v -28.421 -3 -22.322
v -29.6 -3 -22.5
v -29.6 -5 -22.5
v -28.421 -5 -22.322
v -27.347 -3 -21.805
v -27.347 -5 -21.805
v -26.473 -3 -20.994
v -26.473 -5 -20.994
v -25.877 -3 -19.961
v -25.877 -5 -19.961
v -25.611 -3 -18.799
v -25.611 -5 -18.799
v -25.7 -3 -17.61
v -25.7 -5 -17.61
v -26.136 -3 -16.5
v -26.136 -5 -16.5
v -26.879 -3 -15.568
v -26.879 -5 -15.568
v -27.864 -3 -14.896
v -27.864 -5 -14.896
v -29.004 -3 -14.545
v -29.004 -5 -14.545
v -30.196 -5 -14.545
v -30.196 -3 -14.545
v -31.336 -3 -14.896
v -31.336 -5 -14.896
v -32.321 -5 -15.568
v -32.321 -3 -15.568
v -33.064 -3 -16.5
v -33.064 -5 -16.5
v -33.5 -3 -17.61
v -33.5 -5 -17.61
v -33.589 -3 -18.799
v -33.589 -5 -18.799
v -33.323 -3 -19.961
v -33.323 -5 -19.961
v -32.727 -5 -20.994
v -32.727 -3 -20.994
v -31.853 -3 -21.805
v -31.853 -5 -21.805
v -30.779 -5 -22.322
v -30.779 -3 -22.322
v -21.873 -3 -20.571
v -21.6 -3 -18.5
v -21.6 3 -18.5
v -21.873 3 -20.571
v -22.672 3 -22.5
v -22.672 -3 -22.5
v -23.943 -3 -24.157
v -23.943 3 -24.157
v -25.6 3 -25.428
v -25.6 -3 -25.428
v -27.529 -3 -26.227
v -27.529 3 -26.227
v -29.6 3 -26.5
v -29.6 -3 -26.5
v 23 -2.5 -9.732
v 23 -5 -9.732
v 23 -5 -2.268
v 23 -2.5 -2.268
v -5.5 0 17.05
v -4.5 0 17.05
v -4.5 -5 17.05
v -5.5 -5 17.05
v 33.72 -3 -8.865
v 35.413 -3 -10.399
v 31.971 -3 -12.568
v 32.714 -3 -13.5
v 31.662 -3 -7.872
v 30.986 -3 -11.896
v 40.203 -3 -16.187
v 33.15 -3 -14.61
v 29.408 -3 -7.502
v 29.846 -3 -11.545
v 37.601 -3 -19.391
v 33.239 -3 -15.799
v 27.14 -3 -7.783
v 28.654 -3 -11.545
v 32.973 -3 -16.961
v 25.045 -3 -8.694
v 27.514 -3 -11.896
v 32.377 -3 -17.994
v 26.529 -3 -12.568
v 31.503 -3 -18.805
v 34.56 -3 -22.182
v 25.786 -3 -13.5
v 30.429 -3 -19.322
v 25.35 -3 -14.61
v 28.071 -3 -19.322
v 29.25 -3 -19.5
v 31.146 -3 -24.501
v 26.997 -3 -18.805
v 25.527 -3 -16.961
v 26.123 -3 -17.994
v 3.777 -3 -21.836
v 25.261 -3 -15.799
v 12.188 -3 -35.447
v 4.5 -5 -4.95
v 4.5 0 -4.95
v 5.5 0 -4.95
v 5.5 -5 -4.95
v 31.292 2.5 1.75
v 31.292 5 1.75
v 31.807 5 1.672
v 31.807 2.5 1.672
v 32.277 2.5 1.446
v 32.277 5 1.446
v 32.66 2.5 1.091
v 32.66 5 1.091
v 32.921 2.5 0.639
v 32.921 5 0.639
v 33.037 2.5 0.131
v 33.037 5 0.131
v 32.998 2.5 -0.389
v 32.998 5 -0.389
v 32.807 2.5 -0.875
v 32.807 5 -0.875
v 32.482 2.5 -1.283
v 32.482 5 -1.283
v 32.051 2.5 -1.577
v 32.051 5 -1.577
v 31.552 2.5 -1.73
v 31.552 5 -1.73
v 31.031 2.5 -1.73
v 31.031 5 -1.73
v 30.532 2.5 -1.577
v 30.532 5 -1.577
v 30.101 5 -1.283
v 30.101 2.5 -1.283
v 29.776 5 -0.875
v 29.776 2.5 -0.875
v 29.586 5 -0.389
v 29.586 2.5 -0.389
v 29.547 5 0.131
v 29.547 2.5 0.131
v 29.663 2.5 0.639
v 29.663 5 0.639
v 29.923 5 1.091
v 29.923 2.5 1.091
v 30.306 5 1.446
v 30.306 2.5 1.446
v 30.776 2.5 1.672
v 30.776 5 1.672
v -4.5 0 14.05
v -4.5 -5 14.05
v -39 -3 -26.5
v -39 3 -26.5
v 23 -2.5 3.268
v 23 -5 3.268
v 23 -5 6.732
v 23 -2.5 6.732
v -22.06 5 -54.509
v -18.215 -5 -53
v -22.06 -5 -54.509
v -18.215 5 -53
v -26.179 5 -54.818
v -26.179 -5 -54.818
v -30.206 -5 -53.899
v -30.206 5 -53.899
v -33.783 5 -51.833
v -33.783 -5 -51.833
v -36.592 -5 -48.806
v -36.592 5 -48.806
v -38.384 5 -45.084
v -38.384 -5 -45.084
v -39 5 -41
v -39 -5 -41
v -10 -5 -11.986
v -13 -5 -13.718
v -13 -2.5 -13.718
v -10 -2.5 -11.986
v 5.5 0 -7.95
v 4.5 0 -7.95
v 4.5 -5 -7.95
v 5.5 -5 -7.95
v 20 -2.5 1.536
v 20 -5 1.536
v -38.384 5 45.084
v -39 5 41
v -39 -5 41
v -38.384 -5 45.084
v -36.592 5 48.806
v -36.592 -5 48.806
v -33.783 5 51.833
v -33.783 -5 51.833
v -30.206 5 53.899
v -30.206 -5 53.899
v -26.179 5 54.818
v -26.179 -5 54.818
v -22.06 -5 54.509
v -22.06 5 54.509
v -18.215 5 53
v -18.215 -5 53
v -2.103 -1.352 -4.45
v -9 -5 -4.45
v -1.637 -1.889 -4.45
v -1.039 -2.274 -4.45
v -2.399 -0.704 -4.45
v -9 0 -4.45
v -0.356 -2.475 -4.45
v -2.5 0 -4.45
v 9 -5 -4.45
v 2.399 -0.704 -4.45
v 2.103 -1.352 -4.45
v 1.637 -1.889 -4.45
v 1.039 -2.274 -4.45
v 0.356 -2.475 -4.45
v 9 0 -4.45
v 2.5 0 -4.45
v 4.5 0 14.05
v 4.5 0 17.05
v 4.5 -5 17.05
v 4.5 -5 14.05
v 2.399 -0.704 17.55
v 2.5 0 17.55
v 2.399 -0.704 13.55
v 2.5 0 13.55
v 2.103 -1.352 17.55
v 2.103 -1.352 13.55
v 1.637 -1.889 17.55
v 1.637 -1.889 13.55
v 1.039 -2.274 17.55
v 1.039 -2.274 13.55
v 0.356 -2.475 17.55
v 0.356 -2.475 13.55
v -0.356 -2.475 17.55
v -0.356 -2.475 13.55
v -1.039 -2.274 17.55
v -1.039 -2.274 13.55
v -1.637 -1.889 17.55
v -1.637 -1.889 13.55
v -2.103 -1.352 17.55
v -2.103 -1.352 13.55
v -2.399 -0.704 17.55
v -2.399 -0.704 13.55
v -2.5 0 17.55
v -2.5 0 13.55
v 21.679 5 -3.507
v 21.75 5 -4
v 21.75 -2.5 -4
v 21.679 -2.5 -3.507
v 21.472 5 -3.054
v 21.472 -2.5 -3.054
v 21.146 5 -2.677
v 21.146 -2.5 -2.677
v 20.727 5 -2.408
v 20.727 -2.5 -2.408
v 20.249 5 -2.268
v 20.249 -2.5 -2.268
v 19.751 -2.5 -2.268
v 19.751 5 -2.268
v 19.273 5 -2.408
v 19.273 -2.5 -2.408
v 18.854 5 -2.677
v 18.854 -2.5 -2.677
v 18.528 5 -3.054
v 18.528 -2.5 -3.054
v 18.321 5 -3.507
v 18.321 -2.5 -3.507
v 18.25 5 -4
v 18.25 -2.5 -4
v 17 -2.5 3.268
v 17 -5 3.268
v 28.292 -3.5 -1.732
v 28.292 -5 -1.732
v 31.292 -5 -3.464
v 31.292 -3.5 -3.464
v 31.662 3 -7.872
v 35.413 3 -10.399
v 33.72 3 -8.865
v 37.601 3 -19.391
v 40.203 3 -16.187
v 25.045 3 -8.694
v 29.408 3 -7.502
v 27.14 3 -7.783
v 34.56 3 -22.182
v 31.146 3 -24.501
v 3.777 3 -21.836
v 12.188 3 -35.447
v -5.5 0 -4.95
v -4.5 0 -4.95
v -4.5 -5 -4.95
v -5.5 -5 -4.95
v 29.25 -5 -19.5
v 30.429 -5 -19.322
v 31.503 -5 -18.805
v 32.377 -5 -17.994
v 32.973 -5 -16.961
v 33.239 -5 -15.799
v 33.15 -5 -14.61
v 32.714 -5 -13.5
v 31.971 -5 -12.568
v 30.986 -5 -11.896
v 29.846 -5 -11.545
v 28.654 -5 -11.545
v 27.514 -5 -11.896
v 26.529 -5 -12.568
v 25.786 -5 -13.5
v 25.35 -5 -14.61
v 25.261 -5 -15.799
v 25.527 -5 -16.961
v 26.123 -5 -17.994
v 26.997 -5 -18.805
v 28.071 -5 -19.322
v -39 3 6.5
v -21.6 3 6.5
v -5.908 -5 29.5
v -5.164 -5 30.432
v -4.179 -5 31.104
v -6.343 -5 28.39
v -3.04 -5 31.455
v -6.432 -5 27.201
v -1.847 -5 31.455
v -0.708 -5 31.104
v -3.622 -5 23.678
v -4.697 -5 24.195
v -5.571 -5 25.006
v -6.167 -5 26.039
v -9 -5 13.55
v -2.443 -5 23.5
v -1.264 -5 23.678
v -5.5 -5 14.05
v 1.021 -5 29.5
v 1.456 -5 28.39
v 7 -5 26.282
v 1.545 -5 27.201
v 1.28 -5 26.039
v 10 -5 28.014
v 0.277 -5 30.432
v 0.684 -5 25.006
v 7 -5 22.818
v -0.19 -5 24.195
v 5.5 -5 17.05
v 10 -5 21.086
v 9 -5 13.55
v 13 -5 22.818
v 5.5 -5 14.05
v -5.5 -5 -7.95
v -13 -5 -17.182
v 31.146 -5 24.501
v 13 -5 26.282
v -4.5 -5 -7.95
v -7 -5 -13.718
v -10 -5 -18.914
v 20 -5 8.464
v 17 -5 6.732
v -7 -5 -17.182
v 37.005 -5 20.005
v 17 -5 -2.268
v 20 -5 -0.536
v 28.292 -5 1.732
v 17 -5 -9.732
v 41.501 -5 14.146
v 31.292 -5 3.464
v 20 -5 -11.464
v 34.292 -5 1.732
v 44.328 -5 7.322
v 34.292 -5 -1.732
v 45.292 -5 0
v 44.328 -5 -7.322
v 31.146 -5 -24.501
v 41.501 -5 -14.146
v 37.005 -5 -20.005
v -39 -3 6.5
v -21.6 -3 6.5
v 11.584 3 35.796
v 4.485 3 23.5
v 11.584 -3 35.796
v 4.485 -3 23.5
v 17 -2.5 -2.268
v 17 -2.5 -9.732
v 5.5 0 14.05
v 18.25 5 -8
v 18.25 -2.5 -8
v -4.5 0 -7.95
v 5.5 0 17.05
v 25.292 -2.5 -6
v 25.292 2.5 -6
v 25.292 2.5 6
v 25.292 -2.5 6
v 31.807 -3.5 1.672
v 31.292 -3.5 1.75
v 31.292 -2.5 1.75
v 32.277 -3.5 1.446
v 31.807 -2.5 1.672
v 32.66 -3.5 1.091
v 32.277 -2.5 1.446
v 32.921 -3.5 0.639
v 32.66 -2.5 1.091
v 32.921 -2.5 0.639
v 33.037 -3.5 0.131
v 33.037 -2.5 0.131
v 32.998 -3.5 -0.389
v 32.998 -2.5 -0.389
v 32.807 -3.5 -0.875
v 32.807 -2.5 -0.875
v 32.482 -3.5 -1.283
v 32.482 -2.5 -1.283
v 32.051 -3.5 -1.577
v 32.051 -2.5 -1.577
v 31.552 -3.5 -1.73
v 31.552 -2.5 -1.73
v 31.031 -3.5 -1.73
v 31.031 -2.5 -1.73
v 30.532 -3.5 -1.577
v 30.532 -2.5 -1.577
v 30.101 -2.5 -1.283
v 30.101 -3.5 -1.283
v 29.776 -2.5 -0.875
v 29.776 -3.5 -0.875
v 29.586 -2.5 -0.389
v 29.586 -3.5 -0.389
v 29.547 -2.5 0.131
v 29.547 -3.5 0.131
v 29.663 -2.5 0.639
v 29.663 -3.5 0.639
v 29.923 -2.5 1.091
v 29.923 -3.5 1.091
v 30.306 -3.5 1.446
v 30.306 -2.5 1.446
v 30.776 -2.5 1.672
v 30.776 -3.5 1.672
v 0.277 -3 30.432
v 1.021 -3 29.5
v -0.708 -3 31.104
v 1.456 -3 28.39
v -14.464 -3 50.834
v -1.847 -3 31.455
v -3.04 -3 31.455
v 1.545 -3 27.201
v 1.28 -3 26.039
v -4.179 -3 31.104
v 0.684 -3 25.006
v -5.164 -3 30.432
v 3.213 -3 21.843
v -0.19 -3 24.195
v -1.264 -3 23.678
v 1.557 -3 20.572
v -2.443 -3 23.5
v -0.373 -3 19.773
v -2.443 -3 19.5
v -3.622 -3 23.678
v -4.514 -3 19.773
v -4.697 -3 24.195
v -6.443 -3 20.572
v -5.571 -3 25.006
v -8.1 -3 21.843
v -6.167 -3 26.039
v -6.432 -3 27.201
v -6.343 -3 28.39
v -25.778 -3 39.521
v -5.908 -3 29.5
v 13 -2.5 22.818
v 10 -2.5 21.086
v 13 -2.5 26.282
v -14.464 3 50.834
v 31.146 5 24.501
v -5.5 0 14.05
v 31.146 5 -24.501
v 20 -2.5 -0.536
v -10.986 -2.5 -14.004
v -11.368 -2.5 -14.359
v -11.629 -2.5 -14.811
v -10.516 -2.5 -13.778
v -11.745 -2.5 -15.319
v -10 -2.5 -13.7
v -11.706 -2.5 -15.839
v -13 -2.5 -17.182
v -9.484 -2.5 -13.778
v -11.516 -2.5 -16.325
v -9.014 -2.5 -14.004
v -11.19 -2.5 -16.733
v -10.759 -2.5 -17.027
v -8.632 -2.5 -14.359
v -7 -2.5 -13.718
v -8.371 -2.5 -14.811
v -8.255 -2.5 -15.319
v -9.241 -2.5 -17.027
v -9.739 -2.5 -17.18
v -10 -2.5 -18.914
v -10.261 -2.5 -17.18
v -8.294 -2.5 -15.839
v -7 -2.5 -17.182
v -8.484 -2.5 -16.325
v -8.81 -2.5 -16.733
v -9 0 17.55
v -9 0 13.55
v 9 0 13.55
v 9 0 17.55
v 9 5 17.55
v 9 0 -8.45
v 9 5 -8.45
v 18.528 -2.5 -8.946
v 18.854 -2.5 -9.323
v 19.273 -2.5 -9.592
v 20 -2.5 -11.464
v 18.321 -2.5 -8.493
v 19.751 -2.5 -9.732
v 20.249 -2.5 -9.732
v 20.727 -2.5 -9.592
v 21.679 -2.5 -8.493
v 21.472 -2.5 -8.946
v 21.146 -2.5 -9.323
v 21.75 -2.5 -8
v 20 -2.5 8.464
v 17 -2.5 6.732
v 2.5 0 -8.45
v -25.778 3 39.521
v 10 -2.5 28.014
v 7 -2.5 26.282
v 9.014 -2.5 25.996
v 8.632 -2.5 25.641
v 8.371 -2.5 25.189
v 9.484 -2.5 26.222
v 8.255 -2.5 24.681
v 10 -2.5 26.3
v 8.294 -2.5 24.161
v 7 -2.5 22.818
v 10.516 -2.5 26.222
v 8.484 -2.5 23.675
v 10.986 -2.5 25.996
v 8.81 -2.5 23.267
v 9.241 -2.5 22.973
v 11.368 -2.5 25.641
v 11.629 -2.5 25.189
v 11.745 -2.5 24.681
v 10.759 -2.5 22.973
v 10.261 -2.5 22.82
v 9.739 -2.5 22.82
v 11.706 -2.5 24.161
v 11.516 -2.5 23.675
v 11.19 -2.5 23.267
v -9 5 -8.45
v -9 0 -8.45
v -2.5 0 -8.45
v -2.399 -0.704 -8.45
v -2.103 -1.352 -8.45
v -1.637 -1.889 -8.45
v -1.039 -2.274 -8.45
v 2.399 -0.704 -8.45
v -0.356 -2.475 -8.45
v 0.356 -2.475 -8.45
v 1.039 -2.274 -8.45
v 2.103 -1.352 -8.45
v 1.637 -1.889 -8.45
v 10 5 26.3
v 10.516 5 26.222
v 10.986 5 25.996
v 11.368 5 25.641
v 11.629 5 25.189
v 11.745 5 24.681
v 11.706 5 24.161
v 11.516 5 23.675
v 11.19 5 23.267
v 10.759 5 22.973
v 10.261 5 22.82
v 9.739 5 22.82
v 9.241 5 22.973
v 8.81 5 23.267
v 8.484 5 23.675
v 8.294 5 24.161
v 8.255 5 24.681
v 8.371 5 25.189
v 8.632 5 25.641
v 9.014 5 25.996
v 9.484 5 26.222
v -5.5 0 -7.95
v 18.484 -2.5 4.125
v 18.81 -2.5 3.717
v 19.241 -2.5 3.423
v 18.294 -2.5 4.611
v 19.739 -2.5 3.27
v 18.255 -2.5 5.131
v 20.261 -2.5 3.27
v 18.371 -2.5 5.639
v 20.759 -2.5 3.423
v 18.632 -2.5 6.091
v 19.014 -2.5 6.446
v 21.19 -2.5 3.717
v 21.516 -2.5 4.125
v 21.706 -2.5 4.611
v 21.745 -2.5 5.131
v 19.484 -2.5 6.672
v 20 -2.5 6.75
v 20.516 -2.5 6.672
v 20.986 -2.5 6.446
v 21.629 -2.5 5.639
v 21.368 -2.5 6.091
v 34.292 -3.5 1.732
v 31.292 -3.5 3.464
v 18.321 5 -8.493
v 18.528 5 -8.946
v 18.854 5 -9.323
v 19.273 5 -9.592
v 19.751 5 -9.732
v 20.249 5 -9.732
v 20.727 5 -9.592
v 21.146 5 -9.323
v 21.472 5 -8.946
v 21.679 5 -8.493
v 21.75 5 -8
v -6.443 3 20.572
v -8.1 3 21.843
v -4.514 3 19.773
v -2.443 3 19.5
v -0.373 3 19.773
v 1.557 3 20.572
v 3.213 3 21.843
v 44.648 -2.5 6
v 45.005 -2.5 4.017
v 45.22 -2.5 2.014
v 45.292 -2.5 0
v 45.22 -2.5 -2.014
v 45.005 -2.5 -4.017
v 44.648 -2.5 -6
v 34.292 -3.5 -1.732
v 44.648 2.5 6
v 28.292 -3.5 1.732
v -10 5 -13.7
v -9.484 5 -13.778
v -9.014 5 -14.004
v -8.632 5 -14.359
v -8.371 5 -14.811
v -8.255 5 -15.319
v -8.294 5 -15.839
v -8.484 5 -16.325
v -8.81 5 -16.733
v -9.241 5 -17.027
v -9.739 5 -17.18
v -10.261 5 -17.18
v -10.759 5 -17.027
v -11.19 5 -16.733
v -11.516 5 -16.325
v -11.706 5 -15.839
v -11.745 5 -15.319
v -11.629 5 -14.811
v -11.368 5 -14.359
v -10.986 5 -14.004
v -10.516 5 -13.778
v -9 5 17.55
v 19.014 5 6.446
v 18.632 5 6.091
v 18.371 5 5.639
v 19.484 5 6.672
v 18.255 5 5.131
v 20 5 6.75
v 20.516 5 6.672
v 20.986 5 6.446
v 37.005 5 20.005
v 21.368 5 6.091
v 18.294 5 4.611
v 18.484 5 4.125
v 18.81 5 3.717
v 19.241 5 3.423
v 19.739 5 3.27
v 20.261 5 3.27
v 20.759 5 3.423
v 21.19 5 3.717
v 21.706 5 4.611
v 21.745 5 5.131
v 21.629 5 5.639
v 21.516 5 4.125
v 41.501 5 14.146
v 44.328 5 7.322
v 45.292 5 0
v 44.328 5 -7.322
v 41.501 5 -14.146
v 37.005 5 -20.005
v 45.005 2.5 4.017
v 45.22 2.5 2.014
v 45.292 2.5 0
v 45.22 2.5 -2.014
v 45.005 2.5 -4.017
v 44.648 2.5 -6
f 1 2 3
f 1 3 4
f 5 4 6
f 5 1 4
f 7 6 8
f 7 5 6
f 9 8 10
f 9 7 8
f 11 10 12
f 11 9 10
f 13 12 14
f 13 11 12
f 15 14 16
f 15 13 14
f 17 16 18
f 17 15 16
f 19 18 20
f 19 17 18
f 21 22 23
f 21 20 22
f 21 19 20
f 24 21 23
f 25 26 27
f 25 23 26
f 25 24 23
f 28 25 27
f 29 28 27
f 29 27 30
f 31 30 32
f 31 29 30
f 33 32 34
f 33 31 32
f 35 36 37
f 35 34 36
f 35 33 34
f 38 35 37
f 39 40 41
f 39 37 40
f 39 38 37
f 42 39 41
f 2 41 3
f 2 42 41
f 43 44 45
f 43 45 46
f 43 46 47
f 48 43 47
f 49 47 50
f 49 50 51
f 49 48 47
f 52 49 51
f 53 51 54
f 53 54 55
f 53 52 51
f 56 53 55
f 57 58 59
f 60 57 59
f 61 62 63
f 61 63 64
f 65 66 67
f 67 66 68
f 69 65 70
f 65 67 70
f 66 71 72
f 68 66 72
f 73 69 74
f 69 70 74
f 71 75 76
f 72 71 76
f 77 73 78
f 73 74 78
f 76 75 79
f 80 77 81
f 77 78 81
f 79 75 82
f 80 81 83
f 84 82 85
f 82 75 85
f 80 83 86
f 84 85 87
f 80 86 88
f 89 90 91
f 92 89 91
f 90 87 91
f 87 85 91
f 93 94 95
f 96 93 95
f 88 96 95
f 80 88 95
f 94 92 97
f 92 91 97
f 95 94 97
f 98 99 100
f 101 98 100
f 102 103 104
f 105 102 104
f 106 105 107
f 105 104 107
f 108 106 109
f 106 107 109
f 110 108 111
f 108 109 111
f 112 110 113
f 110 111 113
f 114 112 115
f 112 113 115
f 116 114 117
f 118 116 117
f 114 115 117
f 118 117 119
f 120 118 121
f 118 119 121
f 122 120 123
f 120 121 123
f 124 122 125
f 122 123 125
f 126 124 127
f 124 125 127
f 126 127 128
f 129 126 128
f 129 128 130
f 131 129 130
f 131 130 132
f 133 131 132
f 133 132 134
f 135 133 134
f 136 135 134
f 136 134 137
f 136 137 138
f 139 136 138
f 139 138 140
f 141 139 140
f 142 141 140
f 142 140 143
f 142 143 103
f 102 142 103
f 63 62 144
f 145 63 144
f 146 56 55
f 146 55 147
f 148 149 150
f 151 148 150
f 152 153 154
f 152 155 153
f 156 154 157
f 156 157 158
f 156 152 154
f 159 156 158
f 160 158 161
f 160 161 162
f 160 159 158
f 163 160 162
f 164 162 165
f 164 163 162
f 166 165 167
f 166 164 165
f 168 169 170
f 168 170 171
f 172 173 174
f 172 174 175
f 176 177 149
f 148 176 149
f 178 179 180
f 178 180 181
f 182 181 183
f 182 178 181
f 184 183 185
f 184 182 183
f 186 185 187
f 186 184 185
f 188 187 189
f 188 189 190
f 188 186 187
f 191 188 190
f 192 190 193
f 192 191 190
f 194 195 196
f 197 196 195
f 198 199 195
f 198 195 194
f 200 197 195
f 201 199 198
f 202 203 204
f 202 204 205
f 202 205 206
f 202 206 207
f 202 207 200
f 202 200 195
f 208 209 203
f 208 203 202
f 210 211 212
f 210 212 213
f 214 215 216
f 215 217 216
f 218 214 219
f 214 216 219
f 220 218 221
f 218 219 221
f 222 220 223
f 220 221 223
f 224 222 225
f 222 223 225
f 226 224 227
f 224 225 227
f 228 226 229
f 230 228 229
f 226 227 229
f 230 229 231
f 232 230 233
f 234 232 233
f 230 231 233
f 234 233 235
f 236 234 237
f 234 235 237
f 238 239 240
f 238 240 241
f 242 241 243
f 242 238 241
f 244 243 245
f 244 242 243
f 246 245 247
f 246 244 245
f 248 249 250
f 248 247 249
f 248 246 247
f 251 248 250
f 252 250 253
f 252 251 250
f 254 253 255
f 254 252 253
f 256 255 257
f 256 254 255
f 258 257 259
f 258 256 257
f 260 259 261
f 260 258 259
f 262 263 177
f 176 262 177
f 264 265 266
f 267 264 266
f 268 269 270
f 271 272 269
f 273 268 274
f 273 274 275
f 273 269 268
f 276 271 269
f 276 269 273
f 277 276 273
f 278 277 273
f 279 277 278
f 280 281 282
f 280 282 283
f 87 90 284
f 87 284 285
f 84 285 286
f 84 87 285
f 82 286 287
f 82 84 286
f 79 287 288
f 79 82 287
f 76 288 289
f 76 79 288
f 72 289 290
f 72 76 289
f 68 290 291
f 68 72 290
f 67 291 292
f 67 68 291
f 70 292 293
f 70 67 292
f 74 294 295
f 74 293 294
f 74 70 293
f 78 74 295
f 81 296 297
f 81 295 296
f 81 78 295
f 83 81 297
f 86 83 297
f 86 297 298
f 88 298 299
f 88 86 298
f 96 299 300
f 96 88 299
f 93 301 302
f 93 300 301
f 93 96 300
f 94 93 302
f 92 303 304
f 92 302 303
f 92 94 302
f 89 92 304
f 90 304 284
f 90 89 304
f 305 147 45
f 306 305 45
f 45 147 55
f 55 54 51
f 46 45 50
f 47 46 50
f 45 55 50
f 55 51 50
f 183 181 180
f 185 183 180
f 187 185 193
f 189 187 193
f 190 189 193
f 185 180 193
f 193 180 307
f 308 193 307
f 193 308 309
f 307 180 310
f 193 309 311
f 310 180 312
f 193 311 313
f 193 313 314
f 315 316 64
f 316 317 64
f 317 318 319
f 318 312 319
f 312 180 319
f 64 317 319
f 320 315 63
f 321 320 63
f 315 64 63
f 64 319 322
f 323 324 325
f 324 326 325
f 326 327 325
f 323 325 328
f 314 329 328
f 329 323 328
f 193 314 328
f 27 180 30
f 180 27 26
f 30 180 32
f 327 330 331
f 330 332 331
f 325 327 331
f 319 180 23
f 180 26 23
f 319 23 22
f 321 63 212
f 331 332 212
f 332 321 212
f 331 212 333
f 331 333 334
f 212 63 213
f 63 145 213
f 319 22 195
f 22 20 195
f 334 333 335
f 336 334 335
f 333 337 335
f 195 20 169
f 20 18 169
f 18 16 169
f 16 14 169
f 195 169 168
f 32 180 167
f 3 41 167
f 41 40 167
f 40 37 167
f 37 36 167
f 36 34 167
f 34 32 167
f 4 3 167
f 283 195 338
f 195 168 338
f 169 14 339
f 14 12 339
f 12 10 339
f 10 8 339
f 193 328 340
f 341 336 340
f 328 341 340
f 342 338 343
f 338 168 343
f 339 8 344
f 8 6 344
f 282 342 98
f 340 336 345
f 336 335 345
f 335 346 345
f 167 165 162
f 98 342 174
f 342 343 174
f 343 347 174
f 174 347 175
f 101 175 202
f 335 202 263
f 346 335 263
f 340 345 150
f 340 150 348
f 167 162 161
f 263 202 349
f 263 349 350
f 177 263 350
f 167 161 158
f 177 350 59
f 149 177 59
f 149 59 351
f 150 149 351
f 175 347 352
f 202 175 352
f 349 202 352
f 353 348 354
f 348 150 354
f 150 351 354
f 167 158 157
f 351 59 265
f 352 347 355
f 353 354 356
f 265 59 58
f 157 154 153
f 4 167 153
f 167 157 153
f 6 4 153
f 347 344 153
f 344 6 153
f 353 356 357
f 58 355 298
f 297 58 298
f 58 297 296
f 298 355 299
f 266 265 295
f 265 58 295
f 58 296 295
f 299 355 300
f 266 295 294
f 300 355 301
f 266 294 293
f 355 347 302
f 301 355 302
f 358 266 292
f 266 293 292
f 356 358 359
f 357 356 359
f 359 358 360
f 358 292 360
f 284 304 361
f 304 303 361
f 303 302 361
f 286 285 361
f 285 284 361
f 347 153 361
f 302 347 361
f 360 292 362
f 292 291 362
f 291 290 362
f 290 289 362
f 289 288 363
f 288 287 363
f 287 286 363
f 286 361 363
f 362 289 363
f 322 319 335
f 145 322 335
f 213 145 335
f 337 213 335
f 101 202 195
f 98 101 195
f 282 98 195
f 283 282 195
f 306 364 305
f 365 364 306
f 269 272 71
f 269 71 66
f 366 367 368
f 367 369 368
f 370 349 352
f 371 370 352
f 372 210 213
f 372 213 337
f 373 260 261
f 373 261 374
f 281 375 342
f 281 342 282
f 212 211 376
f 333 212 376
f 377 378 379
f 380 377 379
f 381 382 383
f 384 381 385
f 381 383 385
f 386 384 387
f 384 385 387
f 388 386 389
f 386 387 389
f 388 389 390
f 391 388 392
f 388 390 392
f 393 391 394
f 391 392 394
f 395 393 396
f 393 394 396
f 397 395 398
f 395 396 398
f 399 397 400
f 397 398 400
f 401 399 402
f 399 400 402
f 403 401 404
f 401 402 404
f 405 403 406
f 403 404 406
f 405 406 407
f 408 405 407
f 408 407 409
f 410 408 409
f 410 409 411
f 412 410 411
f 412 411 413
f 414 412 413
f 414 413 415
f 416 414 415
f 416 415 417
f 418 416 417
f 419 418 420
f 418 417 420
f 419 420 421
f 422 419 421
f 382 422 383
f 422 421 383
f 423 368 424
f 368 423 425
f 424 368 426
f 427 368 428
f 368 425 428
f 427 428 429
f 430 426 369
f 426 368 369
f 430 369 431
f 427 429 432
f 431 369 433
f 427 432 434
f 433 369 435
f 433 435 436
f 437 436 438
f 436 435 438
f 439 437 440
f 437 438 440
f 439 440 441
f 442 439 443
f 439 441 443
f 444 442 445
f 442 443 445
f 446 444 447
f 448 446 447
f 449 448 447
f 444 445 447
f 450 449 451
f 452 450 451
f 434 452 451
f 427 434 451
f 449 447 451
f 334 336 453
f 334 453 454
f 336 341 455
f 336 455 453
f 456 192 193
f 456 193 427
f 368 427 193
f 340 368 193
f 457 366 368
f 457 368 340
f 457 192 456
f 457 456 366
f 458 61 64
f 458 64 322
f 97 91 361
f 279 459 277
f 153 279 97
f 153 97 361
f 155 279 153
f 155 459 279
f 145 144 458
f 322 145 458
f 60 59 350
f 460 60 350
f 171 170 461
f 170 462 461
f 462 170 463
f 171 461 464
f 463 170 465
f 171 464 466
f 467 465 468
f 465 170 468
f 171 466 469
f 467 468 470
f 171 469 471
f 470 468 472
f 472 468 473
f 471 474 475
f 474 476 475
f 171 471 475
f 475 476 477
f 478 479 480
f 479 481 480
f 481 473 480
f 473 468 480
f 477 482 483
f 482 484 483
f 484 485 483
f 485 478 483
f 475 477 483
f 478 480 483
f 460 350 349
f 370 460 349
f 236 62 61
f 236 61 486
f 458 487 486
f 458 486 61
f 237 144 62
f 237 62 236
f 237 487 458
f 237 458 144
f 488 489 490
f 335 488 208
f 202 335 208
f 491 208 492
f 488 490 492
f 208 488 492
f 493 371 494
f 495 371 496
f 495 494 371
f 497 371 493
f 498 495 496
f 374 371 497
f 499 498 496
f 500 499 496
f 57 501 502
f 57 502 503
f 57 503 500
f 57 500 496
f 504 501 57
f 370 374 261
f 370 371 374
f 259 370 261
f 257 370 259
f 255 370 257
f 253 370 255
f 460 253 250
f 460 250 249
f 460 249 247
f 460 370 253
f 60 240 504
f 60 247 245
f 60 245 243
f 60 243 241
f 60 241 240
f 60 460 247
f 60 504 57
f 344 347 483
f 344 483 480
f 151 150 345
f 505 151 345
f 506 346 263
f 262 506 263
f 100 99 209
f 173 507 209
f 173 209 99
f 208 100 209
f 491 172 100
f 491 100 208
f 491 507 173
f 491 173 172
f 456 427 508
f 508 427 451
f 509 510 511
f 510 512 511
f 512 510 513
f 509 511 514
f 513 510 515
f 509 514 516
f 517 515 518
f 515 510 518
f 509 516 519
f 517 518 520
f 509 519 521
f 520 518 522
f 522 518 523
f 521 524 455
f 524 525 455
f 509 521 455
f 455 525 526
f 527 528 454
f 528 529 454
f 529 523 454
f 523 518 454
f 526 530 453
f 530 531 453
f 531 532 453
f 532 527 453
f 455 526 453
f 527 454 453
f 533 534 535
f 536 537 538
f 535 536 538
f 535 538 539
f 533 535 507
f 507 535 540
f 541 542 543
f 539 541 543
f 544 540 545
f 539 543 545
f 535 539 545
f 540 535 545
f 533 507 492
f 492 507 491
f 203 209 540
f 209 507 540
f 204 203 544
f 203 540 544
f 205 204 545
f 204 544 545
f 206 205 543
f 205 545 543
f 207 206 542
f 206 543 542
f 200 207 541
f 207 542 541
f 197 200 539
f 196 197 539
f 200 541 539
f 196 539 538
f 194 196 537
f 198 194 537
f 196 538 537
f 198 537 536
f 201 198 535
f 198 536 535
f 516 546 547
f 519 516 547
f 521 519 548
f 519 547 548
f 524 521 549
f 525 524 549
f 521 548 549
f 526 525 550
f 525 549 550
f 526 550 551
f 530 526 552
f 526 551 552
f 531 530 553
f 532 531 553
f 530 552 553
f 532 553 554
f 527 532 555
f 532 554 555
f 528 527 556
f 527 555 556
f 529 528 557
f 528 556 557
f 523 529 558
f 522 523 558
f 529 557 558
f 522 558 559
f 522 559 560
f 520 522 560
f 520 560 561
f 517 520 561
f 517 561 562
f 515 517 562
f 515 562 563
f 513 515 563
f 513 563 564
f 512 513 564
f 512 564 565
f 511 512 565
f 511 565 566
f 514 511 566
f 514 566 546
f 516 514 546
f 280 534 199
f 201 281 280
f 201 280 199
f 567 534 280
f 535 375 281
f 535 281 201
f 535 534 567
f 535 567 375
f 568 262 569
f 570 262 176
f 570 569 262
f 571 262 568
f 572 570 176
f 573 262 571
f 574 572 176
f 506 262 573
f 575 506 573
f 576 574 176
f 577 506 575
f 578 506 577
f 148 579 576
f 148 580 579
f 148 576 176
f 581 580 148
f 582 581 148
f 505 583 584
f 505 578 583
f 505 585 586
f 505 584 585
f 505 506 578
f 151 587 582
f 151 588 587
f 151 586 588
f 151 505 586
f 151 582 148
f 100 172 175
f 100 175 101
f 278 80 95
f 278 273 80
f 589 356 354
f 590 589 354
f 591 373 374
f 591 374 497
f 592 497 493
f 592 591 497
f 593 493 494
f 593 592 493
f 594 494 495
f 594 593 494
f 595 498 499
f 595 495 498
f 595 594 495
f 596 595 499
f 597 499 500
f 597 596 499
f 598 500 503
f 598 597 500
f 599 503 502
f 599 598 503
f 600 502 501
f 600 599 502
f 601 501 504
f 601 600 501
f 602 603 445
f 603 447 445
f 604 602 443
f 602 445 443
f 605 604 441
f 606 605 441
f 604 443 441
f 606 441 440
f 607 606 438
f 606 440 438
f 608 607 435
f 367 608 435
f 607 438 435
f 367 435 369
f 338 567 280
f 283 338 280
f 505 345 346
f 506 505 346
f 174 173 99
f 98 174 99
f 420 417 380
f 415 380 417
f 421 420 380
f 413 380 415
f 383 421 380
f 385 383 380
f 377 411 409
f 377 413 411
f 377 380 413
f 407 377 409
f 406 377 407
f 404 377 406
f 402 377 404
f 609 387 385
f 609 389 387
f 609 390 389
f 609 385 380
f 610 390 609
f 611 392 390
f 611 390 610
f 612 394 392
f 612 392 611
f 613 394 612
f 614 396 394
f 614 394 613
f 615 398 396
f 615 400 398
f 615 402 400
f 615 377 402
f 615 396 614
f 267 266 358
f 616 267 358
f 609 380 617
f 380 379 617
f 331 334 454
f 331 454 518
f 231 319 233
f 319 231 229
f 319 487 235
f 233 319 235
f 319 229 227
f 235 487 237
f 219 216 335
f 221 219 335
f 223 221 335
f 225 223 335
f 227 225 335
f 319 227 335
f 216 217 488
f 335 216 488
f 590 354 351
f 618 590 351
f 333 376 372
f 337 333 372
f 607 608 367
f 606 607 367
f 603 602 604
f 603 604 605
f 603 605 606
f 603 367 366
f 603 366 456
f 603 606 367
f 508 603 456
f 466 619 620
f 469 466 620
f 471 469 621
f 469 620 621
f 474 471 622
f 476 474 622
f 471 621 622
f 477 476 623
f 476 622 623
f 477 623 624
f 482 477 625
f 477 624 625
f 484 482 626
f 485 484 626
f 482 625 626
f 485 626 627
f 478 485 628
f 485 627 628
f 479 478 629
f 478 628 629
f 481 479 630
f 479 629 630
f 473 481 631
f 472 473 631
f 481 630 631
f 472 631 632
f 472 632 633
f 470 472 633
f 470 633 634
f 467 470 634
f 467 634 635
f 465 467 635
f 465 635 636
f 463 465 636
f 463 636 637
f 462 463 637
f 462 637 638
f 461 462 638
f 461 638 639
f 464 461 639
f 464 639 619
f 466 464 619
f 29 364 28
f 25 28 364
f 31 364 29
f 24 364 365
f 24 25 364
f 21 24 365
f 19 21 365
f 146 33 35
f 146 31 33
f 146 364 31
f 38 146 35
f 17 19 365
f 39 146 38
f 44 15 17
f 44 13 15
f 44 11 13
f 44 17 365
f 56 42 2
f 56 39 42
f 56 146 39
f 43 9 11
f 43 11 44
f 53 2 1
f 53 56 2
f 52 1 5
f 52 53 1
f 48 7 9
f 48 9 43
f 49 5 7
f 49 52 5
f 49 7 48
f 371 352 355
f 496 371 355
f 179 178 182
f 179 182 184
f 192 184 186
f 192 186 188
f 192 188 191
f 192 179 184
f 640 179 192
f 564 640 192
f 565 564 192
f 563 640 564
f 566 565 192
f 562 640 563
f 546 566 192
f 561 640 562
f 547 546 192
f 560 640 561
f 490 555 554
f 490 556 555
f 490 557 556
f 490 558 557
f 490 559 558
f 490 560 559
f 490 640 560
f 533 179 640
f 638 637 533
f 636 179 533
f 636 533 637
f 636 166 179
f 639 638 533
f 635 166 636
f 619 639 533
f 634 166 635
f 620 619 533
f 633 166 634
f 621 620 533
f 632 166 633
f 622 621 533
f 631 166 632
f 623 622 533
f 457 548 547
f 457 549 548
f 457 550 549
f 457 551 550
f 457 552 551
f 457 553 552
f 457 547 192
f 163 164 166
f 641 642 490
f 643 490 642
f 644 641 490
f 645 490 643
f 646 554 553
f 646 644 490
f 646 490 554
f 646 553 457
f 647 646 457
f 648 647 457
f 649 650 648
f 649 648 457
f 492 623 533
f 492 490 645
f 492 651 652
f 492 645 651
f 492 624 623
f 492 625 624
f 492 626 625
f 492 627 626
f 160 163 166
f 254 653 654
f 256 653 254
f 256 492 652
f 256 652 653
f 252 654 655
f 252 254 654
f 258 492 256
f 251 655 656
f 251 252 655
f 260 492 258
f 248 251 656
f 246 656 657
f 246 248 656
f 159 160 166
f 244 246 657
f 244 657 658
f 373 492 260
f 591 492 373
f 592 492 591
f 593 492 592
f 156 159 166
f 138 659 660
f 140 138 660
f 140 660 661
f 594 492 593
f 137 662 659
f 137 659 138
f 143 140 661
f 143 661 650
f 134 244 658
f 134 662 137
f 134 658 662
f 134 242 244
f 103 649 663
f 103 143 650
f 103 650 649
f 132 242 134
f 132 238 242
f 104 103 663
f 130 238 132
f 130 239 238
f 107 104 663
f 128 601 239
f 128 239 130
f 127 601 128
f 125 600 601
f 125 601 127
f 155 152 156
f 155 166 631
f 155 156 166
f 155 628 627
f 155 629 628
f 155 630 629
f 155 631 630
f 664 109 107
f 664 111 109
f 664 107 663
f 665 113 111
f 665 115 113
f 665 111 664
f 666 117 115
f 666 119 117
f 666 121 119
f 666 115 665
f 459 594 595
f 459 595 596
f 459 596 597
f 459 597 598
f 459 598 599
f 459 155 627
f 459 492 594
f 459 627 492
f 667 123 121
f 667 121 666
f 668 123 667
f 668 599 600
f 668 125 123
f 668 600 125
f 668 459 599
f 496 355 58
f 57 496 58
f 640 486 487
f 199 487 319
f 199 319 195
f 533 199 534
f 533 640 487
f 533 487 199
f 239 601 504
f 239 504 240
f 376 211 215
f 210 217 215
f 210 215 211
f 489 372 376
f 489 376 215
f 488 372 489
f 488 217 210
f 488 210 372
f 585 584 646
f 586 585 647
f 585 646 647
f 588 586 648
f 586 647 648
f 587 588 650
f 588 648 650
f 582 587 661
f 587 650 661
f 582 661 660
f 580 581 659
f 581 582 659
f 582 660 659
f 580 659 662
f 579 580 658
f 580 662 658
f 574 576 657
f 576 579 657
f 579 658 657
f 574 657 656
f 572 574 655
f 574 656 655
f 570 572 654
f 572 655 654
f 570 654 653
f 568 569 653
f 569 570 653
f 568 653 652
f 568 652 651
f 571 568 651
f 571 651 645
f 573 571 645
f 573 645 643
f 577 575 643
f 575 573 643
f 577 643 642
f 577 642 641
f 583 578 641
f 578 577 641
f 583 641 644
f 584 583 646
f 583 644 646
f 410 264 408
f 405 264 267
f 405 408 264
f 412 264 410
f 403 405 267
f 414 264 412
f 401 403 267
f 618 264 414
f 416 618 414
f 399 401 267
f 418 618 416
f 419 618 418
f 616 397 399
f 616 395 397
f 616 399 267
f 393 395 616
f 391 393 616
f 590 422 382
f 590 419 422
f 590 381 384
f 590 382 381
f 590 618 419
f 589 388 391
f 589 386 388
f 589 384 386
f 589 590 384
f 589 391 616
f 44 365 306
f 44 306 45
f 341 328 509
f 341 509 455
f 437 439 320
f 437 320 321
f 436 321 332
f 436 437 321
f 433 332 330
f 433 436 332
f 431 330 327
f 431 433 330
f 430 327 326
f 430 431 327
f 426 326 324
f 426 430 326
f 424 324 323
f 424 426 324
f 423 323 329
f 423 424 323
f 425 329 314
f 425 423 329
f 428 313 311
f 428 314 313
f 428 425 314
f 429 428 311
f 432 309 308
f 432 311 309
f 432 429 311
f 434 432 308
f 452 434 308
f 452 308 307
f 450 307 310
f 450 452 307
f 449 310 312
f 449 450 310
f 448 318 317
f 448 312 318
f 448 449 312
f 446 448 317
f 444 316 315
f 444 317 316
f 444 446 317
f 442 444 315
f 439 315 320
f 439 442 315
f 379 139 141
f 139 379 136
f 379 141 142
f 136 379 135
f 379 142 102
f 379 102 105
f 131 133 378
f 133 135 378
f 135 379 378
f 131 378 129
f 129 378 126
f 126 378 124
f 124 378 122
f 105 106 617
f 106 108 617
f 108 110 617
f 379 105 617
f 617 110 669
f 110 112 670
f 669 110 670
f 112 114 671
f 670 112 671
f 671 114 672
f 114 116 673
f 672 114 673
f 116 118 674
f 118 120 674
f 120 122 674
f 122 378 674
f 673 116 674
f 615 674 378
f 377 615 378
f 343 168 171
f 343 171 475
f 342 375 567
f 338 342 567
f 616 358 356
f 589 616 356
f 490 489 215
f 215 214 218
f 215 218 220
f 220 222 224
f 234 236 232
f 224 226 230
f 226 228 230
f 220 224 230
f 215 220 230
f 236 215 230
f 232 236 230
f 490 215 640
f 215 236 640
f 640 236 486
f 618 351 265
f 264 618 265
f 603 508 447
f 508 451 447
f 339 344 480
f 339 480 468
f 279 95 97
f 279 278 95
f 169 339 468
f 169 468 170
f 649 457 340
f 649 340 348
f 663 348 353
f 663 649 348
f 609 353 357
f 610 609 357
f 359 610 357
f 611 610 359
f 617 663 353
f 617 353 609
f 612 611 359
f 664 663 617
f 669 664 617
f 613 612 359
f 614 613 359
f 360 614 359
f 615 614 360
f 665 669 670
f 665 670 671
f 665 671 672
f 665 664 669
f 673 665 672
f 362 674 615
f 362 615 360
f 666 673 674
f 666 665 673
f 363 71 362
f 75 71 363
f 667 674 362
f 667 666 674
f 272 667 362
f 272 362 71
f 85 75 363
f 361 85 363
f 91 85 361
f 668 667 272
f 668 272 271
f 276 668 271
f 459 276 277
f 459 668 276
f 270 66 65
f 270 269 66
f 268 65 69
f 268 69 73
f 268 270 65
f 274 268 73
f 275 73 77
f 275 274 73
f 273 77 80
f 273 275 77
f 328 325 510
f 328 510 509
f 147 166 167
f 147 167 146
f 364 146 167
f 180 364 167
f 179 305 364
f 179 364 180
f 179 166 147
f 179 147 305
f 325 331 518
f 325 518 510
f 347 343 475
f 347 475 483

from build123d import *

# Parameters (mm, degrees)
BOSS_EXTRUDE1_DEPTH              = 5
MAINSKETCH_19_W                  = 18
MAINSKETCH_19_H                  = 18
BOSS_EXTRUDE2_DEPTH              = 5
CUT_EXTRUDE1_START               = 9
SKETCH1_R                        = 2.5
CUT_EXTRUDE1_DEPTH               = 13
SKETCH2_W                        = 1
SKETCH2_H                        = 3
CUT_EXTRUDE2_DEPTH               = 6
MIRROR2_COPY_1_SKETCH_W          = 1
MIRROR2_COPY_1_SKETCH_H          = 3
MIRROR2_COPY_1_DEPTH             = 6
HOLESKETCH_R                     = 4
CUT_EXTRUDE3_DEPTH               = 6
CUT_EXTRUDE3_DEPTH_BACK          = 2
CUT_EXTRUDE4_DEPTH               = 3
SCHNITT_LINEAR_AUSTRAGEN2_DEPTH  = 2.5
SKIZZE3_R                        = 1.75
SCHNITT_LINEAR_AUSTRAGEN3_DEPTH  = 11
SKIZZE4_R                        = 1.75
SCHNITT_LINEAR_AUSTRAGEN4_DEPTH  = 1.5
SKIZZE6_R                        = 1.75
SCHNITT_LINEAR_AUSTRAGEN6_DEPTH  = 11
SKIZZE7_R                        = 1.75
SCHNITT_LINEAR_AUSTRAGEN7_DEPTH  = 2.5
SKIZZE8_R                        = 1.75
SCHNITT_LINEAR_AUSTRAGEN8_DEPTH  = 11
SKIZZE9_R                        = 1.75
SCHNITT_LINEAR_AUSTRAGEN10_DEPTH = 2.5


with BuildPart() as part:
    # mainSketch → Boss-Extrude1 (new body)
    with BuildSketch(Plane(origin=(0, 0, 0), x_dir=(1, 0, 0), z_dir=(0, 1, 0))):
        with BuildLine():
            ThreePointArc((-18.215390309, 53), (-32.07179677, 53), (-39, 41))
            Line((-39, 41), (-39, -41))
            ThreePointArc((-39, -41), (-32.07179677, -53), (-18.215390309, -53))
            Line((-18.215390309, -53), (31.145825623, -24.501288694))
            ThreePointArc((31.145825623, -24.501288694), (45.291651246, 0), (31.145825623, 24.501288694))
            Line((31.145825623, 24.501288694), (-18.215390309, 53))
        make_face()
        Polygon((-9, -13.55), (-9, 4.45), (-9, 8.45), (9, 8.45), (9, 4.45), (9, -13.55), (9, -17.55), (-9, -17.55), align=None, mode=Mode.SUBTRACT)
    extrude(amount=BOSS_EXTRUDE1_DEPTH)

    # mainSketch_19 → Boss-Extrude2 (add)
    with BuildSketch(Plane(origin=(0, 0, 0), x_dir=(1, 0, 0), z_dir=(0, 1, 0))):
        with BuildLine():
            ThreePointArc((-18.215390309, 53), (-32.07179677, 53), (-39, 41))
            Line((-39, 41), (-39, -41))
            ThreePointArc((-39, -41), (-32.07179677, -53), (-18.215390309, -53))
            Line((-18.215390309, -53), (31.145825623, -24.501288694))
            ThreePointArc((31.145825623, -24.501288694), (45.291651246, 0), (31.145825623, 24.501288694))
            Line((31.145825623, 24.501288694), (-18.215390309, 53))
        make_face()
        with Locations((0, -4.55)):
            Rectangle(MAINSKETCH_19_W, MAINSKETCH_19_H, mode=Mode.SUBTRACT)
    extrude(amount=-BOSS_EXTRUDE2_DEPTH)

    # Sketch1 → Cut-Extrude1 (cut, symmetric)
    with BuildSketch(Plane(origin=(0, 0, 13.55), x_dir=(-1, 0, 0), z_dir=(0, 0, -1)).offset(CUT_EXTRUDE1_START)):
        Circle(SKETCH1_R)
    extrude(amount=CUT_EXTRUDE1_DEPTH, both=True, mode=Mode.SUBTRACT)

    # Sketch2 → Cut-Extrude2 (cut, through all)
    with BuildSketch(Plane(origin=(0, 0, 0), x_dir=(1, 0, 0), z_dir=(0, 1, 0))):
        with Locations((5, -15.55)):
            Rectangle(SKETCH2_W, SKETCH2_H)
    cut_extrude2 = extrude(amount=-CUT_EXTRUDE2_DEPTH, mode=Mode.SUBTRACT)

    # Mirror1: Cut-Extrude2 across plane
    add(cut_extrude2.mirror(Plane(origin=(0, 0, 0), x_dir=(0, 0, 1), z_dir=(1, 0, 0))), mode=Mode.SUBTRACT)

    # Mirror2: Cut-Extrude2 across plane
    add(cut_extrude2.mirror(Plane(origin=(0, 0, 4.55), x_dir=(1, 0, 0), z_dir=(0, 0, -1))), mode=Mode.SUBTRACT)

    # Mirror2 copy 1 sketch → Mirror2 copy 1 (cut, through all)
    with BuildSketch(Plane(origin=(0, 0, 9.1), x_dir=(-1, 0, 0), z_dir=(0, 1, 0))):
        with Locations((5, -15.55)):
            Rectangle(MIRROR2_COPY_1_SKETCH_W, MIRROR2_COPY_1_SKETCH_H)
    extrude(amount=-MIRROR2_COPY_1_DEPTH, mode=Mode.SUBTRACT)

    # holeSketch → Cut-Extrude3 (cut, two sides)
    with BuildSketch(Plane.XZ) as cut_extrude3_sk:
        with Locations(Location((29.25, -15.5, 0), (0, 0, 270))):  # turned: the seam where the file's is
            Circle(HOLESKETCH_R)
        with Locations(Location((-2.443479184, 27.5, 0), (0, 0, 270))):  # turned: the seam where the file's is
            Circle(HOLESKETCH_R)
        with Locations(Location((-29.6, -18.5, 0), (0, 0, 270))):  # turned: the seam where the file's is
            Circle(HOLESKETCH_R)
    extrude(amount=CUT_EXTRUDE3_DEPTH, mode=Mode.SUBTRACT)
    extrude(cut_extrude3_sk.sketch, amount=-CUT_EXTRUDE3_DEPTH_BACK, mode=Mode.SUBTRACT)

    # Sketch3 → Cut-Extrude4 (cut, symmetric)
    with BuildSketch(Plane(origin=(0, 0, 0), x_dir=(1, 0, 0), z_dir=(0, 1, 0))):
        with BuildLine():
            Line((-29.6, 26.5), (-39, 26.5))
            Line((-39, 26.5), (-39.6, 26.5))
            Line((-39.6, 26.5), (-39.6, -6.5))
            Line((-39.6, -6.5), (-37.6, -6.5))
            Line((-37.6, -6.5), (-21.6, -6.5))
            Line((-21.6, -6.5), (-21.6, 18.5))
            ThreePointArc((-21.6, 18.5), (-23.943145751, 24.156854249), (-29.6, 26.5))
        make_face()
        with BuildLine():
            Line((4.484724046, -23.5), (11.583570163, -35.79556215))
            Line((11.583570163, -35.79556215), (-8.960116539, -56.33889432))
            Line((-8.960116539, -56.33889432), (-14.464495813, -50.834420053))
            Line((-14.464495813, -50.834420053), (-25.778106688, -39.520613931))
            Line((-25.778106688, -39.520613931), (-8.100284622, -21.843096939))
            ThreePointArc((-8.100284622, -21.843096939), (-1.399235427, -19.568445614), (4.484724046, -23.5))
        make_face()
        with BuildLine():
            Line((40.858217841, 16.978745932), (35.413092194, 10.399382918))
            ThreePointArc((35.413092194, 10.399382918), (30.548118213, 7.606021972), (25.044818187, 8.694381298))
            Line((25.044818187, 8.694381298), (3.777259743, 21.835574464))
            Line((3.777259743, 21.835574464), (12.187623369, 35.446811868))
            Line((12.187623369, 35.446811868), (14.338041609, 38.927024434))
            Line((14.338041609, 38.927024434), (40.858217841, 16.978745932))
        make_face()
    extrude(amount=CUT_EXTRUDE4_DEPTH, both=True, mode=Mode.SUBTRACT)

    # Skizze2 → Schnitt-Linear austragen2 (cut, symmetric)
    with BuildSketch(Plane(origin=(0, 0, 0), x_dir=(1, 0, 0), z_dir=(0, 1, 0))):
        with BuildLine():
            ThreePointArc((45.291651246, 0), (45.130303789, 3.017207151), (44.648101747, 6))
            Line((44.648101747, 6), (25.291651246, 6))
            Line((25.291651246, 6), (25.291651246, -6))
            Line((25.291651246, -6), (44.648101747, -6))
            ThreePointArc((44.648101747, -6), (45.130303789, -3.017207151), (45.291651246, 0))
        make_face()
    extrude(amount=SCHNITT_LINEAR_AUSTRAGEN2_DEPTH, both=True, mode=Mode.SUBTRACT)

    # Skizze3 → Schnitt-Linear austragen3 (cut, through all)
    with BuildSketch(Plane(origin=(0, 5, 0), x_dir=(1, 0, 0), z_dir=(0, 1, 0))):
        with Locations(Location((31.291651246, 0, 0), (0, 0, 270))):  # turned: the seam where the file's is
            Circle(SKIZZE3_R)
    extrude(amount=-SCHNITT_LINEAR_AUSTRAGEN3_DEPTH, mode=Mode.SUBTRACT)

    # Skizze4 → Schnitt-Linear austragen4 (cut)
    with BuildSketch(Plane.XZ.offset(5)):
        Polygon((34.291651246, 1.732050808), (31.291651246, 3.464101615), (28.291651246, 1.732050808), (28.291651246, -1.732050808), (31.291651246, -3.464101615), (34.291651246, -1.732050808), align=None)
        with Locations(Location((31.291651246, 0, 0), (0, 0, 90))):  # turned: the seam where the file's is
            Circle(SKIZZE4_R, mode=Mode.SUBTRACT)
    extrude(amount=-SCHNITT_LINEAR_AUSTRAGEN4_DEPTH, mode=Mode.SUBTRACT)

    # Skizze6 → Schnitt-Linear austragen6 (cut, through all)
    with BuildSketch(Plane(origin=(0, 5, 0), x_dir=(1, 0, 0), z_dir=(0, 1, 0))):
        with Locations(Location((20, -5, 0), (0, 0, 270))):  # turned: the seam where the file's is
            Circle(SKIZZE6_R)
        with BuildLine():
            Line((18.25, 4), (18.25, 8))
            ThreePointArc((18.25, 8), (20, 9.75), (21.75, 8))
            Line((21.75, 8), (21.75, 4))
            ThreePointArc((21.75, 4), (20, 2.25), (18.25, 4))
        make_face()
    extrude(amount=-SCHNITT_LINEAR_AUSTRAGEN6_DEPTH, mode=Mode.SUBTRACT)

    # Skizze7 → Schnitt-Linear austragen7 (cut)
    with BuildSketch(Plane.XZ.offset(5)):
        Polygon((23, 3.267949192), (23, 6.732050808), (20, 8.464101615), (17, 6.732050808), (17, 3.267949192), (20, 1.535898385), align=None)
        with Locations(Location((20, 5, 0), (0, 0, 90))):  # turned: the seam where the file's is
            Circle(SKIZZE7_R, mode=Mode.SUBTRACT)
        with BuildLine():
            Line((17, -2.267949192), (17, -5.732050808))
            Line((17, -5.732050808), (17.464101615, -6))
            Line((17.464101615, -6), (18.25, -5.546261356))
            Line((18.25, -5.546261356), (18.25, -4))
            ThreePointArc((18.25, -4), (20, -2.25), (21.75, -4))
            Line((21.75, -4), (21.75, -5.546261356))
            Line((21.75, -5.546261356), (22.535898385, -6))
            Line((22.535898385, -6), (23, -5.732050808))
            Line((23, -5.732050808), (23, -2.267949192))
            Line((23, -2.267949192), (20, -0.535898385))
            Line((20, -0.535898385), (17, -2.267949192))
        make_face()
        with BuildLine():
            Line((17.464101615, -6), (17, -6.267949192))
            Line((17, -6.267949192), (17, -9.732050808))
            Line((17, -9.732050808), (20, -11.464101615))
            Line((20, -11.464101615), (23, -9.732050808))
            Line((23, -9.732050808), (23, -6.267949192))
            Line((23, -6.267949192), (22.535898385, -6))
            Line((22.535898385, -6), (21.75, -6.453738644))
            Line((21.75, -6.453738644), (21.75, -8))
            ThreePointArc((21.75, -8), (20, -9.75), (18.25, -8))
            Line((18.25, -8), (18.25, -6.453738644))
            Line((18.25, -6.453738644), (17.464101615, -6))
        make_face()
        Polygon((17.464101615, -6), (17, -5.732050808), (17, -6.267949192), align=None)
        Polygon((18.25, -5.546261356), (17.464101615, -6), (18.25, -6.453738644), align=None)
        Polygon((21.75, -5.546261356), (21.75, -6.453738644), (22.535898385, -6), align=None)
        Polygon((23, -6.267949192), (23, -5.732050808), (22.535898385, -6), align=None)
    extrude(amount=-SCHNITT_LINEAR_AUSTRAGEN7_DEPTH, mode=Mode.SUBTRACT)

    # Skizze8 → Schnitt-Linear austragen8 (cut, through all)
    with BuildSketch(Plane(origin=(0, 5, 0), x_dir=(1, 0, 0), z_dir=(0, 1, 0))):
        with Locations(Location((-10, 15.45, 0), (0, 0, 270))):  # turned: the seam where the file's is
            Circle(SKIZZE8_R)
        with Locations(Location((10, -24.55, 0), (0, 0, 270))):  # turned: the seam where the file's is
            Circle(SKIZZE8_R)
    extrude(amount=-SCHNITT_LINEAR_AUSTRAGEN8_DEPTH, mode=Mode.SUBTRACT)

    # Skizze9 → Schnitt-Linear austragen10 (cut)
    with BuildSketch(Plane(origin=(0, -5, 0), x_dir=(1, 0, 0), z_dir=(0, 1, 0))):
        Polygon((-10, 18.914101615), (-13, 17.182050808), (-13, 13.717949192), (-10, 11.985898385), (-7, 13.717949192), (-7, 17.182050808), align=None)
        with Locations(Location((-10, 15.45, 0), (0, 0, 270))):  # turned: the seam where the file's is
            Circle(SKIZZE9_R, mode=Mode.SUBTRACT)
        Polygon((13, -26.282050808), (13, -22.817949192), (10, -21.085898385), (7, -22.817949192), (7, -26.282050808), (10, -28.014101615), align=None)
        with Locations(Location((10, -24.55, 0), (0, 0, 270))):  # turned: the seam where the file's is
            Circle(SKIZZE9_R, mode=Mode.SUBTRACT)
    extrude(amount=SCHNITT_LINEAR_AUSTRAGEN10_DEPTH, mode=Mode.SUBTRACT)


solid = part.part
